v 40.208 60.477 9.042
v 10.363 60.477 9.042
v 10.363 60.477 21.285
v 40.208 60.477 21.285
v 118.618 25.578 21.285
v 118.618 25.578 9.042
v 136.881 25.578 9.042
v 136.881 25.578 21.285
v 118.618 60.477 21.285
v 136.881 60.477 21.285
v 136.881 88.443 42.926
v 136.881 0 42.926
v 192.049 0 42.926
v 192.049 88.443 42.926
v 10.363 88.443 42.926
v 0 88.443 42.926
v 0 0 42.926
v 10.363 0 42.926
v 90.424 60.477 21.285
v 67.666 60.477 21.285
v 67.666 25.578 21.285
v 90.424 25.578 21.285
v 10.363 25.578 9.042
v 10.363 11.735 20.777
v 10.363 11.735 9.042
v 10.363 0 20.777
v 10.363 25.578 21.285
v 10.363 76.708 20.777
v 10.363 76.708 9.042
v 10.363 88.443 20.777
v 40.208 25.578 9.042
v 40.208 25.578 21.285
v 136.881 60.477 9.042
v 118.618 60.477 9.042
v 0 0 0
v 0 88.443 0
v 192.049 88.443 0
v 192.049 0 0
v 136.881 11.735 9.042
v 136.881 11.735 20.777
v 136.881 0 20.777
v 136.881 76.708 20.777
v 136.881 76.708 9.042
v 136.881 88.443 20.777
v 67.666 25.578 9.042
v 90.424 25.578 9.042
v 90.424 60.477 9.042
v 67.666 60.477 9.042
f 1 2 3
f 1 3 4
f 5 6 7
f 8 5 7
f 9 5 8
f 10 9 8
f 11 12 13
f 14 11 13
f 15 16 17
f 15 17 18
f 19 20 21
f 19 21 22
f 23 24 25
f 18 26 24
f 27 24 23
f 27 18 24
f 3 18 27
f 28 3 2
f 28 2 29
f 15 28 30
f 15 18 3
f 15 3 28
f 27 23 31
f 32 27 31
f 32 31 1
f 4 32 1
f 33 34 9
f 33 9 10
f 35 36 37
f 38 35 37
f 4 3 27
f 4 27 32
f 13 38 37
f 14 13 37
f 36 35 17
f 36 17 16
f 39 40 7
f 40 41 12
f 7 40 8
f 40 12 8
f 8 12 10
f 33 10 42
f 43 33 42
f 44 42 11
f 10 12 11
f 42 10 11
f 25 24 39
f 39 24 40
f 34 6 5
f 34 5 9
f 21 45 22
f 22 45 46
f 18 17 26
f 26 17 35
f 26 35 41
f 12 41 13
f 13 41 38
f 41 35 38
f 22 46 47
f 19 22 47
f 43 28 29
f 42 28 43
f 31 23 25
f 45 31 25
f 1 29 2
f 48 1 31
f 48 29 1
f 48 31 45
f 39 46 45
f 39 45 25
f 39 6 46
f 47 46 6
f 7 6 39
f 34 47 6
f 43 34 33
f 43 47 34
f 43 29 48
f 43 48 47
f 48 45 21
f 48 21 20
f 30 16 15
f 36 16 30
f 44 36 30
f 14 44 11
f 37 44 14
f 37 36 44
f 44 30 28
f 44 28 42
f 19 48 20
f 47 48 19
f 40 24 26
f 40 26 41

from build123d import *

# Parameters (mm, degrees)
F0_W     = 192.0494
F0_H     = 88.4428
F1_DEPTH = 42.926
F2_W     = 126.5174
F2_H     = 88.4428
F3_DEPTH = 22.1488
F4_W     = 126.5174
F4_H     = 64.9732
F5_DEPTH = 11.7348
F6_W     = 29.845
F6_H     = 34.8996
F6_W_2   = 22.7584
F6_W_3   = 18.2626
F7_DEPTH = 12.2428


with BuildPart() as f1:
    # F0 (on Top) → F1 (new body)
    with BuildSketch(Plane.XY):
        with Locations((96.0247, 44.2214)):
            Rectangle(F0_W, F0_H)
    extrude(amount=F1_DEPTH)

    # F2 (on face) → F3 (cut)
    with BuildSketch(Plane.XY.offset(42.926)):
        with Locations((73.6219, 44.2214)):
            Rectangle(F2_W, F2_H)
    extrude(amount=-F3_DEPTH, mode=Mode.SUBTRACT)

    # F4 (on face) → F5 (cut)
    with BuildSketch(Plane.XY.offset(20.7772)):
        with Locations((73.6219, 44.2214)):
            Rectangle(F4_W, F4_H)
    extrude(amount=-F5_DEPTH, mode=Mode.SUBTRACT)

    # F6 (on face) → F7 (join)
    with BuildSketch(Plane.XY.offset(9.0424)):
        with Locations((25.2857, 43.0276)):
            Rectangle(F6_W, F6_H)
        with Locations((79.0448, 43.0276)):
            Rectangle(F6_W_2, F6_H)
        with Locations((127.7493, 43.0276)):
            Rectangle(F6_W_3, F6_H)
    extrude(amount=F7_DEPTH)


solid = f1.part
